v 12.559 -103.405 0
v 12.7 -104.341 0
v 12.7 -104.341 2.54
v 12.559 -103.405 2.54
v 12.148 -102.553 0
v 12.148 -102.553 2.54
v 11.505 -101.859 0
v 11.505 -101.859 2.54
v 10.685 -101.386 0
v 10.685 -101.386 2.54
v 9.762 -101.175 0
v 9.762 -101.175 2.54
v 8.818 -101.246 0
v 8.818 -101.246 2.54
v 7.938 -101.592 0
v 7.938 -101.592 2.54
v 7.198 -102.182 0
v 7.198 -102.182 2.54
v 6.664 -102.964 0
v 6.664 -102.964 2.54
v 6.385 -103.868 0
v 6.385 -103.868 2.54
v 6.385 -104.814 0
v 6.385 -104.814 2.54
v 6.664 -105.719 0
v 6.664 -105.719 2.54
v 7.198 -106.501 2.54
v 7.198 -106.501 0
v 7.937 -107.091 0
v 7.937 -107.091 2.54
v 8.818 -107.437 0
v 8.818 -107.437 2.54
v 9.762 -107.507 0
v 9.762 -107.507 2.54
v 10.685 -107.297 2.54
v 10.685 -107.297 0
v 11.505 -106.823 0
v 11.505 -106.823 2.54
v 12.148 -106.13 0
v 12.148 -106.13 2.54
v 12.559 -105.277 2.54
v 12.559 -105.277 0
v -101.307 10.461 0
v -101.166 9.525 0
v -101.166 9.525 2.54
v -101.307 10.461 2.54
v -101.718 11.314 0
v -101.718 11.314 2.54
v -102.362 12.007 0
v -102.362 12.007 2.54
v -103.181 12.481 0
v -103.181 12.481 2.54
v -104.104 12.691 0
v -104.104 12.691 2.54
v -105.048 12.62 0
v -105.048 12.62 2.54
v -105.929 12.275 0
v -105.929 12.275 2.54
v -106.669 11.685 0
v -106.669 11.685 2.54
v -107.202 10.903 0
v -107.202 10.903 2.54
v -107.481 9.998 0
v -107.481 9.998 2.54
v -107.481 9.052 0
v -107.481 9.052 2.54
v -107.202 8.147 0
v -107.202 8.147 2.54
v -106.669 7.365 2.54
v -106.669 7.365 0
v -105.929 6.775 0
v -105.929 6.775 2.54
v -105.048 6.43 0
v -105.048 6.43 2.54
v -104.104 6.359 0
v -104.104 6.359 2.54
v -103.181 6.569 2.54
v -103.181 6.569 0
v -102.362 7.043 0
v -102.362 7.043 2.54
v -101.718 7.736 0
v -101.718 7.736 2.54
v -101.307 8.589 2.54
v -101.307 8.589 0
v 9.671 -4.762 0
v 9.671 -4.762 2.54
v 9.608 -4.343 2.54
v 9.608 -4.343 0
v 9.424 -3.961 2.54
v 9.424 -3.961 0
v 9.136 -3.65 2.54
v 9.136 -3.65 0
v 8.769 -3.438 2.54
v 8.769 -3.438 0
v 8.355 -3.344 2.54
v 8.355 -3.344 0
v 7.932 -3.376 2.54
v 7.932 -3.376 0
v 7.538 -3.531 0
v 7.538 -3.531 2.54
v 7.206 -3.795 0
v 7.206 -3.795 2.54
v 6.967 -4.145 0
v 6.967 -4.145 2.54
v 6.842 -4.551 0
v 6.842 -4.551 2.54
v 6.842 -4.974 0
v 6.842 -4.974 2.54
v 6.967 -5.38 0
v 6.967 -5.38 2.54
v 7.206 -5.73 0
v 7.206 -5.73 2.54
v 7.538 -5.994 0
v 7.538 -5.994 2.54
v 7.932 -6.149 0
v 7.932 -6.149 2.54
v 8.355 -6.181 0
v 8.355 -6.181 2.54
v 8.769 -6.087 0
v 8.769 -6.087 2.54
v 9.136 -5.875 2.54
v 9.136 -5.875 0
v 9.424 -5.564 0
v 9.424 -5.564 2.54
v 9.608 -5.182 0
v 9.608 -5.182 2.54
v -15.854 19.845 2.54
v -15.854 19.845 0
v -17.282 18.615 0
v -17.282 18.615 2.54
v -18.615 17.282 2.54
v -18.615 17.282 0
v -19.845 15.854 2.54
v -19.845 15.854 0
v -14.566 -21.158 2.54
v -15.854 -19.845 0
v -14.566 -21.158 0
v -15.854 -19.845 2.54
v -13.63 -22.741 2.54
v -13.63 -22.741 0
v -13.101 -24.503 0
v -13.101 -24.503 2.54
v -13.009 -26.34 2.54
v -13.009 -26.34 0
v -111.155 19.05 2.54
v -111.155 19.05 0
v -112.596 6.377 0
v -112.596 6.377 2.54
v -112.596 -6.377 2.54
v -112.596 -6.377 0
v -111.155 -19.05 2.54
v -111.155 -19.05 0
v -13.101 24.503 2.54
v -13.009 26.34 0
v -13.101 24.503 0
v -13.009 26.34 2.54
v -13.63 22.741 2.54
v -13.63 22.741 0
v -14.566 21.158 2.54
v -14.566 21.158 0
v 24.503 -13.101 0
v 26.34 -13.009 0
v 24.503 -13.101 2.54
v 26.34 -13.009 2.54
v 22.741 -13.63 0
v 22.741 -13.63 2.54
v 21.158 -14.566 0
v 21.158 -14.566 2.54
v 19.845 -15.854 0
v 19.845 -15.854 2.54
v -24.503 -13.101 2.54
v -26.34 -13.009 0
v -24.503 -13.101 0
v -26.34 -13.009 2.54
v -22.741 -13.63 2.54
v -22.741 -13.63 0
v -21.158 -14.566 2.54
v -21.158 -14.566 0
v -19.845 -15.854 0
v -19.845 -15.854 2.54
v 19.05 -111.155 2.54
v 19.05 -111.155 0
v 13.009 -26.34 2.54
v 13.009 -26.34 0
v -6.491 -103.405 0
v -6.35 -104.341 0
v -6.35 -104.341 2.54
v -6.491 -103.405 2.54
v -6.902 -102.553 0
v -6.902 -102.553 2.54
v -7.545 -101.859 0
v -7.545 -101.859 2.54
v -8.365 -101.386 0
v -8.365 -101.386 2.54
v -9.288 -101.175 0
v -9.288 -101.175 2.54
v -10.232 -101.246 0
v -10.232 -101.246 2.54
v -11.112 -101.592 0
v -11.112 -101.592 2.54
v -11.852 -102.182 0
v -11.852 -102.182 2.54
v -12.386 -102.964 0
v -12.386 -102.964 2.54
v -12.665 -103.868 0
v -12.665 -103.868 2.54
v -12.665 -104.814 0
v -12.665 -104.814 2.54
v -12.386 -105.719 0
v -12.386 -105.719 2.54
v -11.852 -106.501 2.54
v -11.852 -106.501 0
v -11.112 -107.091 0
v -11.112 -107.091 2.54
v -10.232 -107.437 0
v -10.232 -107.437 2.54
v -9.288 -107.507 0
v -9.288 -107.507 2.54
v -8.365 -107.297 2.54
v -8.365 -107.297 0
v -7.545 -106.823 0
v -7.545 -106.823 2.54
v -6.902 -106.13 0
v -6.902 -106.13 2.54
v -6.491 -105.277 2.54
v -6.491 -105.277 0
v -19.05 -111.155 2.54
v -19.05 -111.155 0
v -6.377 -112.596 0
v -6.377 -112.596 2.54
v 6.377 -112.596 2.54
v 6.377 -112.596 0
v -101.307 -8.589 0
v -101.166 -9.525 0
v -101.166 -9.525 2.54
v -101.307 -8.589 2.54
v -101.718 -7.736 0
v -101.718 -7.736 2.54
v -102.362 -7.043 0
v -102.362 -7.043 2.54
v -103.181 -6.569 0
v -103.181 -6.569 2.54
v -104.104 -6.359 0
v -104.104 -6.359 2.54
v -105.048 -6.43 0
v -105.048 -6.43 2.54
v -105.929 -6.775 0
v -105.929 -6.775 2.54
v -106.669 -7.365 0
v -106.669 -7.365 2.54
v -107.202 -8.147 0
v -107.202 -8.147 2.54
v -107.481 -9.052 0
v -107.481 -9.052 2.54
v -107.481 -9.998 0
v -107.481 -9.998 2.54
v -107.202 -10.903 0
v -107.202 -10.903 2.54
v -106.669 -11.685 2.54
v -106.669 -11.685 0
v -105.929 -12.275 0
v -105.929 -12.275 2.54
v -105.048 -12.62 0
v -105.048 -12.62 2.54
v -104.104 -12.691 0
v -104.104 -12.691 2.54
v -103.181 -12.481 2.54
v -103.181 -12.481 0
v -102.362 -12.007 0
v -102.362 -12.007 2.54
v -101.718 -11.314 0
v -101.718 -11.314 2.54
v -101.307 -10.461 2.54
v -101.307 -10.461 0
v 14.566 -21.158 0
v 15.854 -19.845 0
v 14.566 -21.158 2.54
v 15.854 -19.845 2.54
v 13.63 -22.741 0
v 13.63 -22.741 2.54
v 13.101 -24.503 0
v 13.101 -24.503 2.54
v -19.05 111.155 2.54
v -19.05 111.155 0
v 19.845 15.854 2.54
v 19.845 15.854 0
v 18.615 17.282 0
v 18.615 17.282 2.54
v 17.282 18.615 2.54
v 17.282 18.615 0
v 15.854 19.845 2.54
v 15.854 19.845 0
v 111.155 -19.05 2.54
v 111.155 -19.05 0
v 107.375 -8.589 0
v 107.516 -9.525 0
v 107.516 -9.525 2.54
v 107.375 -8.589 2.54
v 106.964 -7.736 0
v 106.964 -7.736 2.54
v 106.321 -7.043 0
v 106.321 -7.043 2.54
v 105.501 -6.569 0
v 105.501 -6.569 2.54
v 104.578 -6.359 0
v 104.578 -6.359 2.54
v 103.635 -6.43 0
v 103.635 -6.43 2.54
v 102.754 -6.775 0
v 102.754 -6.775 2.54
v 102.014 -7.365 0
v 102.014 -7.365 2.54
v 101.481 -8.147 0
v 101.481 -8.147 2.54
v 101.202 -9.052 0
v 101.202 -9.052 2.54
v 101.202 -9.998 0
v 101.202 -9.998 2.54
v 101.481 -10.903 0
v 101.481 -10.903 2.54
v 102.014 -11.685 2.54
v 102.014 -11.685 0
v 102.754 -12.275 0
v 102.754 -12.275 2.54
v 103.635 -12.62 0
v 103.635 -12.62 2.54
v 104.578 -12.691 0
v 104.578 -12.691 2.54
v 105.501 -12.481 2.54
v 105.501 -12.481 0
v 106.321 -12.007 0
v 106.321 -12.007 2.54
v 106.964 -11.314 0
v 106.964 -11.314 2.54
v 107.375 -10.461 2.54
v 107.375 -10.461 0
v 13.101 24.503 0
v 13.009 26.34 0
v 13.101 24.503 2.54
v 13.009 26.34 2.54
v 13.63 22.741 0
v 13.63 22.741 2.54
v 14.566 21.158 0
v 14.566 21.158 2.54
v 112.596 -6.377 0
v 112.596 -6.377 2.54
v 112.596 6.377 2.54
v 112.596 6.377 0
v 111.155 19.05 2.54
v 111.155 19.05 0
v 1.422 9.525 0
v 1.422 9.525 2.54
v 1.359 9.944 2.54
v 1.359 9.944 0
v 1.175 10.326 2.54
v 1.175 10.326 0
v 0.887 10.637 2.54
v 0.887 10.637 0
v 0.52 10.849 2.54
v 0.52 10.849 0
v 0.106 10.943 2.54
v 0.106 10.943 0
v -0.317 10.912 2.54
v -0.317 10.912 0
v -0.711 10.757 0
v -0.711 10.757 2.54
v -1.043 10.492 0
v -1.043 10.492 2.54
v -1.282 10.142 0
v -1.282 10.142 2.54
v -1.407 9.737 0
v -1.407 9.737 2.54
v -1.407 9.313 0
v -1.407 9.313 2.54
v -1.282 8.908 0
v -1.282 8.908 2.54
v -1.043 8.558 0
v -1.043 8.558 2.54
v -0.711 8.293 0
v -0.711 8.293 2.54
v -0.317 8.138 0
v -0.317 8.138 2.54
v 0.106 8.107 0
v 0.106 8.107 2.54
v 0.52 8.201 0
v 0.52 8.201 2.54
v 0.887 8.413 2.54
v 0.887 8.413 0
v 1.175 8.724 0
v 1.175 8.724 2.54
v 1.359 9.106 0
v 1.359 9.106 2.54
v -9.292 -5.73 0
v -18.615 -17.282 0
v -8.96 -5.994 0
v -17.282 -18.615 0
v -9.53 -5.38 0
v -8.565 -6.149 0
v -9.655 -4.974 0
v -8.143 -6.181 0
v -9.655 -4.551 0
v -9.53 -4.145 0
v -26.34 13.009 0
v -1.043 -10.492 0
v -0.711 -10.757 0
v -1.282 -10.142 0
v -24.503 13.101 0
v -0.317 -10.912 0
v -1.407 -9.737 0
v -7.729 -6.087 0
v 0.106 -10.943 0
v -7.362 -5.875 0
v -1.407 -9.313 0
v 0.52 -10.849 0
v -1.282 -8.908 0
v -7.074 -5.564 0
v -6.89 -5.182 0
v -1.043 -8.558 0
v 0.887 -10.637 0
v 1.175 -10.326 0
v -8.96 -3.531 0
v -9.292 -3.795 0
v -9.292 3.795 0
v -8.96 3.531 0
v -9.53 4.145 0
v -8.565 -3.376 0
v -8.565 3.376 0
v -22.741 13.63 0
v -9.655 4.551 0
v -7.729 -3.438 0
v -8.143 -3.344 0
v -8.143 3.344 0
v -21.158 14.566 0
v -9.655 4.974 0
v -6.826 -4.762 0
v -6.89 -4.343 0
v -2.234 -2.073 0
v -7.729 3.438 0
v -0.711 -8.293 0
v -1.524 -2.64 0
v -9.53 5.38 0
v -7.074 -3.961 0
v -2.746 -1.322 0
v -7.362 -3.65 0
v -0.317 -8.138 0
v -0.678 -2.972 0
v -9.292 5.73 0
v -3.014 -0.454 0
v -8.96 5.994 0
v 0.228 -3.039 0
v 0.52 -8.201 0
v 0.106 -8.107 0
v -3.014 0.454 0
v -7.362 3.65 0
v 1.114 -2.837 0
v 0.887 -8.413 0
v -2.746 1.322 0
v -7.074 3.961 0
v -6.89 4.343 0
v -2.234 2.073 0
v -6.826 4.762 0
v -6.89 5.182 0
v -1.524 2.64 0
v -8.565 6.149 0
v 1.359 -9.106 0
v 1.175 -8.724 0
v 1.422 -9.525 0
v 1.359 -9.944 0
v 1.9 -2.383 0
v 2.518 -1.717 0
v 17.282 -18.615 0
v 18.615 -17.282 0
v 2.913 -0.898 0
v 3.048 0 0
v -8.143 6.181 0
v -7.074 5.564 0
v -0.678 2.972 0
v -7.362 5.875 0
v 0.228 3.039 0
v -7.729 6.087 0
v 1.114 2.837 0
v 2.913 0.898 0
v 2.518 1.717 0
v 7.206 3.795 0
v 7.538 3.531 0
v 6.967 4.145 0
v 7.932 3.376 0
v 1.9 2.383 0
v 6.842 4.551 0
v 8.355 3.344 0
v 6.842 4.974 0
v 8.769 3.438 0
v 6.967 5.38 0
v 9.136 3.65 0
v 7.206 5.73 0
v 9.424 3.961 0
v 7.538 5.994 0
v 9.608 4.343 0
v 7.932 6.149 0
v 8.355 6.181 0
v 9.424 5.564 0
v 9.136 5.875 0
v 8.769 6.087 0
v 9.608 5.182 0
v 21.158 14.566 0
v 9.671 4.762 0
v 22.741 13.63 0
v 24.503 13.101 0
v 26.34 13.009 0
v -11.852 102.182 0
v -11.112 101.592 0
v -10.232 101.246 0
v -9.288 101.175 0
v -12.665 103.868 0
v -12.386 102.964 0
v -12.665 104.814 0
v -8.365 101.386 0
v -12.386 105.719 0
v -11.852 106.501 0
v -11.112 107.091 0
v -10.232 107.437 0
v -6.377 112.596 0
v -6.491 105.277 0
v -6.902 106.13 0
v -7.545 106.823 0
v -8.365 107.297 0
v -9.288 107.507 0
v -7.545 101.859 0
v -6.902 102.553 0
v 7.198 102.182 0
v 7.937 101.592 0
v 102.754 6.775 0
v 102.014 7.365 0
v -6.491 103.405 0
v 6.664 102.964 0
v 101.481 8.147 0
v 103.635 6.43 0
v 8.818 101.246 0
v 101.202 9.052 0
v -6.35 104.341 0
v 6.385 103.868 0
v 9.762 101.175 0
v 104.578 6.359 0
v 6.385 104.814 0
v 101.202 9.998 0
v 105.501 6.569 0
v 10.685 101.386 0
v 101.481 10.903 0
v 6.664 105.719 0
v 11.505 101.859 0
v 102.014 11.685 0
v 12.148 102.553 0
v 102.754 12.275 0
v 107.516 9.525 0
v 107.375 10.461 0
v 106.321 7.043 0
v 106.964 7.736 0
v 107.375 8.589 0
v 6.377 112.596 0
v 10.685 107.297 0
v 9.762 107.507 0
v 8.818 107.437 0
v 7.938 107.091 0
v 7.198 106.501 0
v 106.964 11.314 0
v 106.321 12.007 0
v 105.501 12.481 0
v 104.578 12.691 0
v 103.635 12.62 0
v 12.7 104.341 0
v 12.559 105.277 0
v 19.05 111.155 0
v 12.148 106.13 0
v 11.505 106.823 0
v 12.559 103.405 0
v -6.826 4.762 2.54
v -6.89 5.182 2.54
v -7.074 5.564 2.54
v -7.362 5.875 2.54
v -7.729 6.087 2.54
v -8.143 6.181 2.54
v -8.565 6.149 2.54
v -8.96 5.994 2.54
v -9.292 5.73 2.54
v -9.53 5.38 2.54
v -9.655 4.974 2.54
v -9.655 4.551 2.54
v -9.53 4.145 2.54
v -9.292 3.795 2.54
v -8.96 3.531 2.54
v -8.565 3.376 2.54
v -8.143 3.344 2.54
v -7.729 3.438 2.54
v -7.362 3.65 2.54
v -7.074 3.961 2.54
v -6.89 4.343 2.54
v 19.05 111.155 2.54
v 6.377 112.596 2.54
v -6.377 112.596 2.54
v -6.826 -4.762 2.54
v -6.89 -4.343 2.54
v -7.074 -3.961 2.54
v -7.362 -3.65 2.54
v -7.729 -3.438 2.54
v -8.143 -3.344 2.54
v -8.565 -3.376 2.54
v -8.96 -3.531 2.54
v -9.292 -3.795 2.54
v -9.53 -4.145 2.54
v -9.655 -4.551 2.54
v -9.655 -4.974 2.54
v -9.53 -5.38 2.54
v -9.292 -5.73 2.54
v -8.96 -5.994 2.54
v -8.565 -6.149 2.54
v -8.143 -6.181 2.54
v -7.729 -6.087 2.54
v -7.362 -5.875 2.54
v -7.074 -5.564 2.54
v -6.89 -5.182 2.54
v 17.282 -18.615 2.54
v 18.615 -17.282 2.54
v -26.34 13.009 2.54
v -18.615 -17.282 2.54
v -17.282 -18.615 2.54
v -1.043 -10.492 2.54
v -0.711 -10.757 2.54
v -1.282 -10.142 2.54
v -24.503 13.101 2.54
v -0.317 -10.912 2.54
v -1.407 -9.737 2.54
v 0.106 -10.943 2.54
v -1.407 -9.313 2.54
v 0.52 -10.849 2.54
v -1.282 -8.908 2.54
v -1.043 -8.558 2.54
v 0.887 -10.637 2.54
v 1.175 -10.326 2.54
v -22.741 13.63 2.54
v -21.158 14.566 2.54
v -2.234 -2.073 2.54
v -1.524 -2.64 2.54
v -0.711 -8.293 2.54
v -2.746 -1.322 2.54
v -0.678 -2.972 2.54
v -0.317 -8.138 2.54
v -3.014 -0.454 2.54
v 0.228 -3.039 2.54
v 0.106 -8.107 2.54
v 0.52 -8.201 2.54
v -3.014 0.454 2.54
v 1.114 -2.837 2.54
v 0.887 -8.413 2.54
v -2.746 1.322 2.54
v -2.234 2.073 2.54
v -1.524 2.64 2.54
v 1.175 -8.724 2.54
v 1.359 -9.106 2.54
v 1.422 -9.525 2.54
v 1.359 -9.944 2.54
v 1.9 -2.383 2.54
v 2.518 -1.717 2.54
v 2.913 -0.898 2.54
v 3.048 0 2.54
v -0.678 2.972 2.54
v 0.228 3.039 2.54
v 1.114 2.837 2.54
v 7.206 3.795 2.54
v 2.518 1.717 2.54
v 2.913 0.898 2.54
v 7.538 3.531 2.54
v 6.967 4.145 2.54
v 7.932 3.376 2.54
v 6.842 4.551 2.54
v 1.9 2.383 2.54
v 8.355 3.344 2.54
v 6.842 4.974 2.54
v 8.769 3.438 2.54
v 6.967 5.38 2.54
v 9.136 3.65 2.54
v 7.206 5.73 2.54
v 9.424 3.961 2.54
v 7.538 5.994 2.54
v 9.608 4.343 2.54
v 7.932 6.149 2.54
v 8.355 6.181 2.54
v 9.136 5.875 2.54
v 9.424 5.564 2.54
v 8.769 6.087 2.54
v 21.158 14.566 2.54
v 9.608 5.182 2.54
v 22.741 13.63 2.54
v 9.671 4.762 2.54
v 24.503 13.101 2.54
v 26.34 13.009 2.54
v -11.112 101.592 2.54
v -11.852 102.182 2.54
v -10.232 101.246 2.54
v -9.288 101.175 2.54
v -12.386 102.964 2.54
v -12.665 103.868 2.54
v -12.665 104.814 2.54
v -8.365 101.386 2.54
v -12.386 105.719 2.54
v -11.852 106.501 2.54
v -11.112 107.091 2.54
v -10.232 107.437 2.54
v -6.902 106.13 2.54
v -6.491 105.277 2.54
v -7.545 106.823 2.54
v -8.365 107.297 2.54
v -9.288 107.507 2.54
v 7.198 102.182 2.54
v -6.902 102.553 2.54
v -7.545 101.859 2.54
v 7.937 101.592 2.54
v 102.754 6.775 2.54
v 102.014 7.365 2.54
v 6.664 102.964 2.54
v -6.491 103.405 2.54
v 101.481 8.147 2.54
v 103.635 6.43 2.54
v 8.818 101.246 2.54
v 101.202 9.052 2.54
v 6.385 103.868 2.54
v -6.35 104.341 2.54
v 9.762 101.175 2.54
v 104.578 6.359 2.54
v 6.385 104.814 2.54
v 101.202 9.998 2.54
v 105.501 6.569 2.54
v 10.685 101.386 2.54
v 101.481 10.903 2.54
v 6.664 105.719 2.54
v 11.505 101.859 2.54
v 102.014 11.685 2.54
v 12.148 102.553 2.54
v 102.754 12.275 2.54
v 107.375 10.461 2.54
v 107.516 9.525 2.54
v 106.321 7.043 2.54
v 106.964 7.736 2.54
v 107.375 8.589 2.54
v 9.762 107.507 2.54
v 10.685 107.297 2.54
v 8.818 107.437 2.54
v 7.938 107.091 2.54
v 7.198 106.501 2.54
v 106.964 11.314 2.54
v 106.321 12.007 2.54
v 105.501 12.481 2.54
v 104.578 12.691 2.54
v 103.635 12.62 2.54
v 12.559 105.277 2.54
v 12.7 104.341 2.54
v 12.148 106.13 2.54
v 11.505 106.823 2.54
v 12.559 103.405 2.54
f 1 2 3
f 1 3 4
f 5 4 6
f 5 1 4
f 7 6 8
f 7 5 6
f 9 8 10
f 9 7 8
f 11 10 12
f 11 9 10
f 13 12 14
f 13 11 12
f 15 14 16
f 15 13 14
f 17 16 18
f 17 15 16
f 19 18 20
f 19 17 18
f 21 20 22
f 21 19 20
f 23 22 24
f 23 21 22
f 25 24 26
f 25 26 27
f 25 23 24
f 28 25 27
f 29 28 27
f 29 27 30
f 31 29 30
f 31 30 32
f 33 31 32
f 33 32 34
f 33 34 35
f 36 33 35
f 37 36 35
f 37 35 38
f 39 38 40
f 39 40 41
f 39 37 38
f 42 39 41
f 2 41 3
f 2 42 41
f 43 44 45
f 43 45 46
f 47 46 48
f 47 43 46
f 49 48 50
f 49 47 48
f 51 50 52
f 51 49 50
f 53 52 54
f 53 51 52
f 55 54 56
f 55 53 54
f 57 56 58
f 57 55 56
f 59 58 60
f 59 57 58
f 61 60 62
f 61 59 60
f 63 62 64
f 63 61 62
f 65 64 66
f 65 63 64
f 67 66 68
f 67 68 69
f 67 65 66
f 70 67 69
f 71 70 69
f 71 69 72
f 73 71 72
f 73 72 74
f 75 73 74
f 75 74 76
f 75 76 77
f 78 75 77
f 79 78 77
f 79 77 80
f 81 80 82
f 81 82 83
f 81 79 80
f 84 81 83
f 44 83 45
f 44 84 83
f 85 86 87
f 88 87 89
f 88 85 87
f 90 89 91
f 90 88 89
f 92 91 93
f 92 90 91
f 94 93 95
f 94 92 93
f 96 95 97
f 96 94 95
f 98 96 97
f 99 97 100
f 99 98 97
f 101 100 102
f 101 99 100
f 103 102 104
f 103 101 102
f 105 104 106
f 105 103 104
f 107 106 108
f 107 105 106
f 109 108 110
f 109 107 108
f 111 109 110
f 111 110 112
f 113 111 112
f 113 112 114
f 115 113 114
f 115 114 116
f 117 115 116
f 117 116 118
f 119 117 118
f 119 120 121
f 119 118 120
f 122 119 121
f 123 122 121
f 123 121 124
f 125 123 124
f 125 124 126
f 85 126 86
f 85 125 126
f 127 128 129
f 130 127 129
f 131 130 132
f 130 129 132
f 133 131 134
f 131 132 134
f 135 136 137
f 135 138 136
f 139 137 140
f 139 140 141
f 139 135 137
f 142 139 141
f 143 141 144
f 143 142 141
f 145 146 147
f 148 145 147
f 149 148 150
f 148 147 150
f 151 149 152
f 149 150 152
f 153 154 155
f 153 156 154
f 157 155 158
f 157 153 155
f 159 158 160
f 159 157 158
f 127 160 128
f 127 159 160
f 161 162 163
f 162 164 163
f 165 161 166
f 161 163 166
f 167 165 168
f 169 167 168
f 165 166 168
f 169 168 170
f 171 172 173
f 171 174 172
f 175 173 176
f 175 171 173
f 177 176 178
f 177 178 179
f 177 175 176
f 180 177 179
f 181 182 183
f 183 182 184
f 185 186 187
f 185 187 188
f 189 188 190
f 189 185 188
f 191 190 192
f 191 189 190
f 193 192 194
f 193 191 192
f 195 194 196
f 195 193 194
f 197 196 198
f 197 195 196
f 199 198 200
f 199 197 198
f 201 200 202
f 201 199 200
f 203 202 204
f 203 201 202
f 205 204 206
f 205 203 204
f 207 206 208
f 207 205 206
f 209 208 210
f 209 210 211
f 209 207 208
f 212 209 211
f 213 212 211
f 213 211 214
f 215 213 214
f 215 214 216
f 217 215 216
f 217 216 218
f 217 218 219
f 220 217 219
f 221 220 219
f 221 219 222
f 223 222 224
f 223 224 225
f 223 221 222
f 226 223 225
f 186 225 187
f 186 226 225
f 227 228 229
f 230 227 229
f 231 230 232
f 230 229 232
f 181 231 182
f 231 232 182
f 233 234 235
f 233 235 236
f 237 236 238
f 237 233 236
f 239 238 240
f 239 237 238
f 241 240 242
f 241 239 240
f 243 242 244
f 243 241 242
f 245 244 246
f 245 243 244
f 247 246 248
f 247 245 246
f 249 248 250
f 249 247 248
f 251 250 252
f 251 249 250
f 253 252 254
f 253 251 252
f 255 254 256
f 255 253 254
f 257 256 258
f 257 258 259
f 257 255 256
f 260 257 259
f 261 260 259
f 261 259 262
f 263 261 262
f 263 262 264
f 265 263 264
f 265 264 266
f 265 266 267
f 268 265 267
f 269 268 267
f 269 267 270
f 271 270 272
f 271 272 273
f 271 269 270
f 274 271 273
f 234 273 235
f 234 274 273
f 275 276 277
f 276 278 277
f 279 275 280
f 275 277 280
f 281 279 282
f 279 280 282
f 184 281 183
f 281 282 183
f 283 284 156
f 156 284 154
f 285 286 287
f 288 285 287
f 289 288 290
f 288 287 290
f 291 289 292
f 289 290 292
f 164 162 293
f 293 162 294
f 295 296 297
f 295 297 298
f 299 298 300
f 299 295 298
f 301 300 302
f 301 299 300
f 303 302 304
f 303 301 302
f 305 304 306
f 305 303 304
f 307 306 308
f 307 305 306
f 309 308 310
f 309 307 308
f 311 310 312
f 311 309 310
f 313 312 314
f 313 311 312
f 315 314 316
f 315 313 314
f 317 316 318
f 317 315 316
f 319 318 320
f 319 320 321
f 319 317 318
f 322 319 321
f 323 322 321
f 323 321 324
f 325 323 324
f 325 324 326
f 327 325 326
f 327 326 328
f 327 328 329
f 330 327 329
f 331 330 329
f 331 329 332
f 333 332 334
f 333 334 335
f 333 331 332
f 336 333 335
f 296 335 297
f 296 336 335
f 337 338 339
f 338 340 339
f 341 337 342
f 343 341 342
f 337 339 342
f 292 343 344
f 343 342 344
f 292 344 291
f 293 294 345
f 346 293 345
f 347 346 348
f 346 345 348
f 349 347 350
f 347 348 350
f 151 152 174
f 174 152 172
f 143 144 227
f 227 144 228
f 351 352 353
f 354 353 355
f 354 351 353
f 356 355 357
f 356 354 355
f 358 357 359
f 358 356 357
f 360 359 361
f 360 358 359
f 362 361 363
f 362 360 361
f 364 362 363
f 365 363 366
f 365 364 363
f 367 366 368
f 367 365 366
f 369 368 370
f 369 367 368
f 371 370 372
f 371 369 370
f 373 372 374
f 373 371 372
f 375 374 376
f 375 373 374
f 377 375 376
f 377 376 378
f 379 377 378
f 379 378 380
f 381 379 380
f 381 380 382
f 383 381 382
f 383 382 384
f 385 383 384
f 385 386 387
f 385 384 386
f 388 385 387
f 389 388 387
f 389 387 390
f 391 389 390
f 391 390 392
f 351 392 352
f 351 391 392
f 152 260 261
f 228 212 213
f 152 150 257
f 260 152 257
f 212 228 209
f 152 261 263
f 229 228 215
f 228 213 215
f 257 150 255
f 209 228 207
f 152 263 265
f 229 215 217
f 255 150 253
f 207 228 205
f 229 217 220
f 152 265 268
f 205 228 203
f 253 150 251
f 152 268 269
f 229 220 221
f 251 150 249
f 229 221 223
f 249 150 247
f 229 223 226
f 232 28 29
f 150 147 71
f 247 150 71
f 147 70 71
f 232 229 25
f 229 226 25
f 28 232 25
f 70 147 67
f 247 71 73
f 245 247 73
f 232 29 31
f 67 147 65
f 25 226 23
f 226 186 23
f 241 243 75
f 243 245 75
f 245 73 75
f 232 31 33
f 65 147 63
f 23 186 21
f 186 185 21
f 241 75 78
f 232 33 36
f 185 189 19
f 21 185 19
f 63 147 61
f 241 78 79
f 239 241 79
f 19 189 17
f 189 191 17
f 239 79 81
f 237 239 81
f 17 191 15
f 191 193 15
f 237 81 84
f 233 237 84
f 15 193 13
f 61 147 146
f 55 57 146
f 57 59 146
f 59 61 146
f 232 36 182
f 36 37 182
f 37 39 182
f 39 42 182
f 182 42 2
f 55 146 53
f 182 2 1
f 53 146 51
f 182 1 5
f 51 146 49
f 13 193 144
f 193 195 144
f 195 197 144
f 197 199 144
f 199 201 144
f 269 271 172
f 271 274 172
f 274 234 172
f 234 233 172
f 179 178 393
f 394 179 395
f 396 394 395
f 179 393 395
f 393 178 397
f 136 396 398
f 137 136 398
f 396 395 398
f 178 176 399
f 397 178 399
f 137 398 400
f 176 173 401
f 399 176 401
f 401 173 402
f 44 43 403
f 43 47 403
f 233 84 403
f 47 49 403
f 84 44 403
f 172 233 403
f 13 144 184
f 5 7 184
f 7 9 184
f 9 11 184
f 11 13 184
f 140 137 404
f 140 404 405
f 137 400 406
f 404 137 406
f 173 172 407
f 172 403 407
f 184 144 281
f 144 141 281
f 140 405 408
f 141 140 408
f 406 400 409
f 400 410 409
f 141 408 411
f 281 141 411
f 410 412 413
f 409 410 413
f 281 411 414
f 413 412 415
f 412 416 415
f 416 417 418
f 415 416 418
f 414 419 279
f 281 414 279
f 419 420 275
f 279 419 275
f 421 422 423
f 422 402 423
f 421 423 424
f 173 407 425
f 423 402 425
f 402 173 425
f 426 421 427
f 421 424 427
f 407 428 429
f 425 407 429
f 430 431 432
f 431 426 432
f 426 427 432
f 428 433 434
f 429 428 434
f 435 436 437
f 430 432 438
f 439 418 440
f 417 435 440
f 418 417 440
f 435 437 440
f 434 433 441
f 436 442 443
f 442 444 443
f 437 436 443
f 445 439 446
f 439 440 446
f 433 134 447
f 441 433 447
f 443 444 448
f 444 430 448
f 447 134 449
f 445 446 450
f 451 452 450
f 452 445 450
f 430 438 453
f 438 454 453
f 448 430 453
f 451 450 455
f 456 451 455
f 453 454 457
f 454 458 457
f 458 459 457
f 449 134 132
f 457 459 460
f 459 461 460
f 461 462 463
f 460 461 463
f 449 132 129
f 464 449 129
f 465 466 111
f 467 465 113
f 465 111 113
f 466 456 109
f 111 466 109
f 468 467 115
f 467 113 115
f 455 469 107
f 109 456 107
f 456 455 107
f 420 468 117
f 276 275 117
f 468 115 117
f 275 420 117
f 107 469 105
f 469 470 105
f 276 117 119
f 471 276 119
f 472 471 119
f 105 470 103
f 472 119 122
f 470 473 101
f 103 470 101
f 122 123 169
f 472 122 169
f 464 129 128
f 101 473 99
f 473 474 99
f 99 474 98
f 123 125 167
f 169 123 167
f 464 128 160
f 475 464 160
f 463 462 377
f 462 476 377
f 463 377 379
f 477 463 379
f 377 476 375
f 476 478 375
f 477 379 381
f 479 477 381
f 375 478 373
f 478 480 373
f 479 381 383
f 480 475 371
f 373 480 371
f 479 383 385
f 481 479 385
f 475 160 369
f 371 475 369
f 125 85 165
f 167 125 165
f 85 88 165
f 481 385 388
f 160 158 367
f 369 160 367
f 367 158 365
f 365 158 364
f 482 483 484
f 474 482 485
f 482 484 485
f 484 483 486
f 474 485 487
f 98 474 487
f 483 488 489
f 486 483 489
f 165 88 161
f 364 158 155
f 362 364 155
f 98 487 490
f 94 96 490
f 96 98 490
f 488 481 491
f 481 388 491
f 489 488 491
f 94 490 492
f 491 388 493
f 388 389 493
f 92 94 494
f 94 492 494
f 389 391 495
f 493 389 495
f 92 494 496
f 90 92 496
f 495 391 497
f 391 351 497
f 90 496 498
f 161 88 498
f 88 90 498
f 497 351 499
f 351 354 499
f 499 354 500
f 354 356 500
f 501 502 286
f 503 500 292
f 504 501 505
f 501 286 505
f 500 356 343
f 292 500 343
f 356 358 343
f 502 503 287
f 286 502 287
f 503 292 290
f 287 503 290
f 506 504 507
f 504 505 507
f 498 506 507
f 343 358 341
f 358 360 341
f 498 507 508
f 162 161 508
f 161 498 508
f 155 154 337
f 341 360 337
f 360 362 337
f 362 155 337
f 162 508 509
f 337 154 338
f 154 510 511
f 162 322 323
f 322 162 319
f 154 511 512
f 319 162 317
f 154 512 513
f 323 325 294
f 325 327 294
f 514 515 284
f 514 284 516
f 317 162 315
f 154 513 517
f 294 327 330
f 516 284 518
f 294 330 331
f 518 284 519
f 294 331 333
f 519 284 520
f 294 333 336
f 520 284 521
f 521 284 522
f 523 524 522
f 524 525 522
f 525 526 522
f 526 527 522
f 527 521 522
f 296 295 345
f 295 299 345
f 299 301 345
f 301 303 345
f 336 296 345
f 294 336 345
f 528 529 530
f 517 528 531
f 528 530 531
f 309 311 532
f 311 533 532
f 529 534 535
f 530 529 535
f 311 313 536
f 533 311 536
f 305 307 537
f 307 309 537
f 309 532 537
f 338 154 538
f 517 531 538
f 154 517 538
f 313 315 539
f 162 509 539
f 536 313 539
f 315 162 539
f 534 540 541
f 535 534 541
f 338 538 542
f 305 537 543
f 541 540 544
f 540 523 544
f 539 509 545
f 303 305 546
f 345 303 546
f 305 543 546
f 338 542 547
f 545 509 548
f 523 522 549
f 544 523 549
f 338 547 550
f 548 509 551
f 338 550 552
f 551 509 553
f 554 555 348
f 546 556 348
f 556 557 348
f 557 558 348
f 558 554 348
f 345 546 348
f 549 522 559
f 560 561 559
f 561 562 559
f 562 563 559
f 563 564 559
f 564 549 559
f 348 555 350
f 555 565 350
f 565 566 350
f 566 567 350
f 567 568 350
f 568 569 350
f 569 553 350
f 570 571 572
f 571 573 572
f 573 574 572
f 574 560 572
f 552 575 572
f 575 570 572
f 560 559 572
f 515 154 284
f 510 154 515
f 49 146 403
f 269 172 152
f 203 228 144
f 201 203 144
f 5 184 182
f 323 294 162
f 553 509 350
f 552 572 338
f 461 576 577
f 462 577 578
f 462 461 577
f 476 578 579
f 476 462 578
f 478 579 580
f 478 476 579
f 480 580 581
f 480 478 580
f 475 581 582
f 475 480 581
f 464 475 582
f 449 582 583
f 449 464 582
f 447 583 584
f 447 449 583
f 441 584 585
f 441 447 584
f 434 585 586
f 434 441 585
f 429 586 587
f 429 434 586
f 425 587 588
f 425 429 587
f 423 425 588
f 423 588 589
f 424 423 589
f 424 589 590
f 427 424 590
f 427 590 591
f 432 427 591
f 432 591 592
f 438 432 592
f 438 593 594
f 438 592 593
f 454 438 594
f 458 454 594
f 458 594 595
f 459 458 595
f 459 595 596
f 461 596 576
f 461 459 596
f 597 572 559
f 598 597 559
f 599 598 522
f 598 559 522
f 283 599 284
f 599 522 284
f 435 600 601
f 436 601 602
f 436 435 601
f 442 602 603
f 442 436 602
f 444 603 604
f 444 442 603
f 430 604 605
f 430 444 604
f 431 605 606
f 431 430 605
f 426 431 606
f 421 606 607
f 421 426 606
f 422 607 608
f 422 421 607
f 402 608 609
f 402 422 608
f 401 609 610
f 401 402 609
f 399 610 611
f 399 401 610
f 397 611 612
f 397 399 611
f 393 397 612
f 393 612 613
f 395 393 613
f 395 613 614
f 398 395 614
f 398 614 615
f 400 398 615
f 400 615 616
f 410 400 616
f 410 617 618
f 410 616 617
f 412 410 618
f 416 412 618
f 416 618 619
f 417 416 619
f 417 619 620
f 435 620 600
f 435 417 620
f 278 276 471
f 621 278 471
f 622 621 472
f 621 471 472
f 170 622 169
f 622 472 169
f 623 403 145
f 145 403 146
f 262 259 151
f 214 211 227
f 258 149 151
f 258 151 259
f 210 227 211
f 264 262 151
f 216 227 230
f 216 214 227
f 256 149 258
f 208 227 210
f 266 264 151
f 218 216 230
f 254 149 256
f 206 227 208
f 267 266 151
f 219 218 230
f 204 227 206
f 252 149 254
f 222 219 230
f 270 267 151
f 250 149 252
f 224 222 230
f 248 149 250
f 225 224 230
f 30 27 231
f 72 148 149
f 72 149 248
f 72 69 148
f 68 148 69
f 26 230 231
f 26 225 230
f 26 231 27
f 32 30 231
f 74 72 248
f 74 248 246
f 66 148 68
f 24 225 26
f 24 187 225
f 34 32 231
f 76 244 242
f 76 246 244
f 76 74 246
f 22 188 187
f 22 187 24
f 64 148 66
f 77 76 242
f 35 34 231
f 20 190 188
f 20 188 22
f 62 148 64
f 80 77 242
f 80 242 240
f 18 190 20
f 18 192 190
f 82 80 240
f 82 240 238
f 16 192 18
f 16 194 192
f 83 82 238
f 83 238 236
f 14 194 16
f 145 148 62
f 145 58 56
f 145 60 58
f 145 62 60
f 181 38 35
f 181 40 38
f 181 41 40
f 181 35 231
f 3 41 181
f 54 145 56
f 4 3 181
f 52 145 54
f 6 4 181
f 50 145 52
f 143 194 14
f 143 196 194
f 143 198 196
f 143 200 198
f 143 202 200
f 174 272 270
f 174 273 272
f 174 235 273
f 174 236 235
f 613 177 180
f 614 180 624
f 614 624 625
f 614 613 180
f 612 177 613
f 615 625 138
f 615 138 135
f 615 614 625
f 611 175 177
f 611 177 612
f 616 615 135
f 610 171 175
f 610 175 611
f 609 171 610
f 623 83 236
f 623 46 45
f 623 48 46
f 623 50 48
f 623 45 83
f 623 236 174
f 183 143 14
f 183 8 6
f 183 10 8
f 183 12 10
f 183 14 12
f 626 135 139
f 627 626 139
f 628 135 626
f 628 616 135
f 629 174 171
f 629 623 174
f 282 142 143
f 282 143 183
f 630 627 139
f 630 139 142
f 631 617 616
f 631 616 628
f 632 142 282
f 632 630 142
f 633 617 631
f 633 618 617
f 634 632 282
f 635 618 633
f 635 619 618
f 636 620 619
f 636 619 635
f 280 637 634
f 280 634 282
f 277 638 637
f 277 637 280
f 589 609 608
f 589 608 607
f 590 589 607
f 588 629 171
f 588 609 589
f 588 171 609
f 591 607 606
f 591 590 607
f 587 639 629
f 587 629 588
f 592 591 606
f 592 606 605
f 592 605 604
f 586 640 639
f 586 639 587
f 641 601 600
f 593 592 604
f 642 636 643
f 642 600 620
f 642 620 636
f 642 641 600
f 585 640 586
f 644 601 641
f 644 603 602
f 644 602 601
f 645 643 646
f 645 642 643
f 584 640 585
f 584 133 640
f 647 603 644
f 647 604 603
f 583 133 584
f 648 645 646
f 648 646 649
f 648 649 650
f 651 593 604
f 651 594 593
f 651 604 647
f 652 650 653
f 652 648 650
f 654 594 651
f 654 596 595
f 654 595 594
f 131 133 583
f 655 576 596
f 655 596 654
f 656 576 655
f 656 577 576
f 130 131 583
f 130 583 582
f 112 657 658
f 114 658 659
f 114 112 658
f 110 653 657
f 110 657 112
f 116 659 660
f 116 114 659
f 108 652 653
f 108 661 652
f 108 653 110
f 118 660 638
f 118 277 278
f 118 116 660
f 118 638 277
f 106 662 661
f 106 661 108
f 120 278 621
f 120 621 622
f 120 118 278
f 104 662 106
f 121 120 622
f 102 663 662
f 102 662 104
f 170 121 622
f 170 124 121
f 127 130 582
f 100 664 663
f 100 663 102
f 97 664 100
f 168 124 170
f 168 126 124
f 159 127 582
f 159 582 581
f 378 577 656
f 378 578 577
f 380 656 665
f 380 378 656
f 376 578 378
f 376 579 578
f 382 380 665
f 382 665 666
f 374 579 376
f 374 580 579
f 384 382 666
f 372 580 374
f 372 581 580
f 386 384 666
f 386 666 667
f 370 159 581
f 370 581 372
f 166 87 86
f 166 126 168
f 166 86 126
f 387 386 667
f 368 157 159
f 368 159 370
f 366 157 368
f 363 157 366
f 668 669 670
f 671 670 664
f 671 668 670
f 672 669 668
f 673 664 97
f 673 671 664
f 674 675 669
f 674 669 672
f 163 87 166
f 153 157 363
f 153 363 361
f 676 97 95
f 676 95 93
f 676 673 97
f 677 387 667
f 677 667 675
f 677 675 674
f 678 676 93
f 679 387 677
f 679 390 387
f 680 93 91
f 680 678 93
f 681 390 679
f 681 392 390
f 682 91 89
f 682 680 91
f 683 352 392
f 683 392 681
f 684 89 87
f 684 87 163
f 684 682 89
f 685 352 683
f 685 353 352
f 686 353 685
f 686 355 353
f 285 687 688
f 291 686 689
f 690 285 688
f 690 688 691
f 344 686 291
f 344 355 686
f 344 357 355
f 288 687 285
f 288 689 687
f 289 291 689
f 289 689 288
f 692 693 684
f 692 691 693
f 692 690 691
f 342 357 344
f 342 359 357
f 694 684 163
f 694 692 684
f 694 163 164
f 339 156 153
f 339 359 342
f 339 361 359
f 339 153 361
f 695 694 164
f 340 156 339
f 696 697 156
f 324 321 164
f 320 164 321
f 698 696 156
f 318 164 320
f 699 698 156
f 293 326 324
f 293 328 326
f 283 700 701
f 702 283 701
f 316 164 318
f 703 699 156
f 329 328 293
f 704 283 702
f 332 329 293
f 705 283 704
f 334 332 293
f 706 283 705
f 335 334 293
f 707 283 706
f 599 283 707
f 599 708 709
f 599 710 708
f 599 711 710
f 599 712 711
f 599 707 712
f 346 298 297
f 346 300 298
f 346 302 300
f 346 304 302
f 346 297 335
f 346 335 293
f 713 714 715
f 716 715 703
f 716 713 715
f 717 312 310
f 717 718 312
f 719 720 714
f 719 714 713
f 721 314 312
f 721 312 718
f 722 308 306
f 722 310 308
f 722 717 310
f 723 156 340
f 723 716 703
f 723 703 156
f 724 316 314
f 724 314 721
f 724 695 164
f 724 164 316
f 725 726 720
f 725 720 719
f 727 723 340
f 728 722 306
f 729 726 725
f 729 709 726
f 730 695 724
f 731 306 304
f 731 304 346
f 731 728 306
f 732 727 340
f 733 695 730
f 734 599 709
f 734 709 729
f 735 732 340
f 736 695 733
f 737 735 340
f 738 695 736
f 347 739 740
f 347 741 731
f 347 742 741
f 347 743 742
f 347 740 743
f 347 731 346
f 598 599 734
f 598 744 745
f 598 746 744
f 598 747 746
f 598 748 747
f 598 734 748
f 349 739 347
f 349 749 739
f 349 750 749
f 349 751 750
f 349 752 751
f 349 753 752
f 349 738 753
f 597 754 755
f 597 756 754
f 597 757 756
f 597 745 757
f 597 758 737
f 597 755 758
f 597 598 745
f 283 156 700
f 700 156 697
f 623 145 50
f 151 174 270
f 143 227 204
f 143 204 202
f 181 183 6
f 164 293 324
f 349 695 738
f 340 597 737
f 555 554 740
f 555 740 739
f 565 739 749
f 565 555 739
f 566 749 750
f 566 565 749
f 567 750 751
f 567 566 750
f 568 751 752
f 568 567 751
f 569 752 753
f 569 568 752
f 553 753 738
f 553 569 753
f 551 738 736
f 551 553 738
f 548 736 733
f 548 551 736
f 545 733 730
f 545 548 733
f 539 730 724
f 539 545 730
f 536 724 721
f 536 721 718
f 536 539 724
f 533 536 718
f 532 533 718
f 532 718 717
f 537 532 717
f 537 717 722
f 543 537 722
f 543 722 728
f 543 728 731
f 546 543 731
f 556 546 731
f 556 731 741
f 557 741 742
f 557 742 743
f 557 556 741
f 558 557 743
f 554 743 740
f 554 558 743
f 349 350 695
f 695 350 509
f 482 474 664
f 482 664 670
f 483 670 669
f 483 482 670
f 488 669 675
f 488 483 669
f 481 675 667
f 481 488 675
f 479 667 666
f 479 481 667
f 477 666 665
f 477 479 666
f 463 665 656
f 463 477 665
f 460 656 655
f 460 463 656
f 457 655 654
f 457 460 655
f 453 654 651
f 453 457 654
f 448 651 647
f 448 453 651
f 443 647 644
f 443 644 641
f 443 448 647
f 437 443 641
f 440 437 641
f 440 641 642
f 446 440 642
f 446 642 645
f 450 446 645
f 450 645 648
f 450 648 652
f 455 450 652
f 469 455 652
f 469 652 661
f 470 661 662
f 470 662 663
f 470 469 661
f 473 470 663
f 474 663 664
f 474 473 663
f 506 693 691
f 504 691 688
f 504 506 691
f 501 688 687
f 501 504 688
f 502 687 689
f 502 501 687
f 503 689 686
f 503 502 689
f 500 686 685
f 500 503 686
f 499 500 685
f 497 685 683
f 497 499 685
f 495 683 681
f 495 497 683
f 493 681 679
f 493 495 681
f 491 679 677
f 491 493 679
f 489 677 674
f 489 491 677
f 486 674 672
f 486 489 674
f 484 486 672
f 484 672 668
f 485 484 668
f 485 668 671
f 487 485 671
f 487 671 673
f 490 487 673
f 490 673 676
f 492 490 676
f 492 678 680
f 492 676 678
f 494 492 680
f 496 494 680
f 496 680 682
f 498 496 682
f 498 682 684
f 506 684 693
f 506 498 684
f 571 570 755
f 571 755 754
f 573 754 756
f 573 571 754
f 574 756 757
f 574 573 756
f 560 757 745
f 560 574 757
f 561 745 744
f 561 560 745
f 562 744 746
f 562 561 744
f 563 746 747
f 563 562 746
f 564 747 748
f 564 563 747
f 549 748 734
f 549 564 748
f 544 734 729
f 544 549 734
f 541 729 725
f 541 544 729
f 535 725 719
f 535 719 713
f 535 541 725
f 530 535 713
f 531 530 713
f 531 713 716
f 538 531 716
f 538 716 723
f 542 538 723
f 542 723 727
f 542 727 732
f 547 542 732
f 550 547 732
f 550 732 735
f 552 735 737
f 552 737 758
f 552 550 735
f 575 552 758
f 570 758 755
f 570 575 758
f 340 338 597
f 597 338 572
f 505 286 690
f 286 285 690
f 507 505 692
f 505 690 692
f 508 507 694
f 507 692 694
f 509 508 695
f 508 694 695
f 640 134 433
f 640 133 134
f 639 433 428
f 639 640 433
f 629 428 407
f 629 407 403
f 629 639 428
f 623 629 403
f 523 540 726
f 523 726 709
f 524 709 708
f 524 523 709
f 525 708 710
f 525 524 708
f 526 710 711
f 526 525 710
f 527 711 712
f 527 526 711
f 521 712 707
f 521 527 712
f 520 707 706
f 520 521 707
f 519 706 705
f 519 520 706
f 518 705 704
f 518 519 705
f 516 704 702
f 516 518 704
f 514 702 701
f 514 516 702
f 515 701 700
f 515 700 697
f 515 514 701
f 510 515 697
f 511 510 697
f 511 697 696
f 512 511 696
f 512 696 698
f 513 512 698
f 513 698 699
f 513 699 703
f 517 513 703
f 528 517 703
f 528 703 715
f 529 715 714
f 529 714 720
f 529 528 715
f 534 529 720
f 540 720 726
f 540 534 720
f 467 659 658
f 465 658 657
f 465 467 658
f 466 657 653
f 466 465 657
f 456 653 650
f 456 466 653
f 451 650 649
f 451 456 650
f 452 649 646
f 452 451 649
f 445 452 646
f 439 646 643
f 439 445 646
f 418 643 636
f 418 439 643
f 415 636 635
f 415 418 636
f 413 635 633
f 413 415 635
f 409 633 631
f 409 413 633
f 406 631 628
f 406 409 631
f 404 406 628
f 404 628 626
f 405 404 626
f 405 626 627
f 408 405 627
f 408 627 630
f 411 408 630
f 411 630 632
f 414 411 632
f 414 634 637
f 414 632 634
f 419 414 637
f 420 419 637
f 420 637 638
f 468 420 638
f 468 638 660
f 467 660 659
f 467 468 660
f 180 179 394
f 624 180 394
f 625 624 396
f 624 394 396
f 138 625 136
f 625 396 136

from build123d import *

# Parameters (mm, degrees)
SKETCH1_R           = 3.048
SKETCH1_R_2         = 3.175
BOSS_EXTRUDE1_DEPTH = 2.54
FILLET1_R           = 7.62
SKETCH2_R           = 1.4224
CUT_EXTRUDE1_DEPTH  = 160.50957323


with BuildPart() as part:
    # Sketch1 → Boss-Extrude1 (new body)
    with BuildSketch(Plane.XY):
        with BuildLine():
            Line((-19.05, 111.155403269), (-12.7, 21.997045256))
            ThreePointArc((-12.7, 21.997045256), (-17.960512242, 17.960512242), (-21.997045256, 12.7))
            Line((-21.997045256, 12.7), (-111.155403269, 19.05))
            ThreePointArc((-111.155403269, 19.05), (-112.776, 0), (-111.155403269, -19.05))
            Line((-111.155403269, -19.05), (-21.997045256, -12.7))
            ThreePointArc((-21.997045256, -12.7), (-17.960512242, -17.960512242), (-12.7, -21.997045256))
            Line((-12.7, -21.997045256), (-19.05, -111.155403269))
            ThreePointArc((-19.05, -111.155403269), (0, -112.776), (19.05, -111.155403269))
            Line((19.05, -111.155403269), (12.7, -21.997045256))
            ThreePointArc((12.7, -21.997045256), (17.960512242, -17.960512242), (21.997045256, -12.7))
            Line((21.997045256, -12.7), (111.155403269, -19.05))
            ThreePointArc((111.155403269, -19.05), (112.776, 0), (111.155403269, 19.05))
            Line((111.155403269, 19.05), (21.997045256, 12.7))
            ThreePointArc((21.997045256, 12.7), (17.960512242, 17.960512242), (12.7, 21.997045256))
            Line((12.7, 21.997045256), (19.05, 111.155403269))
            ThreePointArc((19.05, 111.155403269), (0, 112.776), (-19.05, 111.155403269))
        make_face()
        Circle(SKETCH1_R, mode=Mode.SUBTRACT)
        with Locations((9.525, 104.341147205)):
            Circle(SKETCH1_R_2, mode=Mode.SUBTRACT)
        with Locations((-9.525, 104.341147205)):
            Circle(SKETCH1_R_2, mode=Mode.SUBTRACT)
        with Locations((104.341147205, 9.525)):
            Circle(SKETCH1_R_2, mode=Mode.SUBTRACT)
        with Locations((104.341147205, -9.525)):
            Circle(SKETCH1_R_2, mode=Mode.SUBTRACT)
        with Locations((9.525, -104.341147205)):
            Circle(SKETCH1_R_2, mode=Mode.SUBTRACT)
        with Locations((-9.525, -104.341147205)):
            Circle(SKETCH1_R_2, mode=Mode.SUBTRACT)
        with Locations((-104.341147205, -9.525)):
            Circle(SKETCH1_R_2, mode=Mode.SUBTRACT)
        with Locations((-104.341147205, 9.525)):
            Circle(SKETCH1_R_2, mode=Mode.SUBTRACT)
    extrude(amount=BOSS_EXTRUDE1_DEPTH)

    # Fillet1
    fillet1_edges = [part.edges().sort_by_distance(p)[0] for p in [
        (12.7, 21.997045256, 1.27),
        (21.997045256, 12.7, 1.27),
        (21.997045256, -12.7, 1.27),
        (12.7, -21.997045256, 1.27),
        (-12.7, -21.997045256, 1.27),
        (-21.997045256, -12.7, 1.27),
        (-21.997045256, 12.7, 1.27),
        (-12.7, 21.997045256, 1.27),
    ]]
    fillet(fillet1_edges, radius=FILLET1_R)

    # Sketch2 → Cut-Extrude1 (cut, through all)
    with BuildSketch(Plane.XY):
        with Locations((0, 9.525)):
            Circle(SKETCH2_R)
        with Locations((8.248891971, 4.7625)):
            Circle(SKETCH2_R)
        with Locations((8.248891971, -4.7625)):
            Circle(SKETCH2_R)
        with Locations((0, -9.525)):
            Circle(SKETCH2_R)
        with Locations((-8.248891971, -4.7625)):
            Circle(SKETCH2_R)
        with Locations((-8.248891971, 4.7625)):
            Circle(SKETCH2_R)
    extrude(amount=CUT_EXTRUDE1_DEPTH, mode=Mode.SUBTRACT)


solid = part.part
